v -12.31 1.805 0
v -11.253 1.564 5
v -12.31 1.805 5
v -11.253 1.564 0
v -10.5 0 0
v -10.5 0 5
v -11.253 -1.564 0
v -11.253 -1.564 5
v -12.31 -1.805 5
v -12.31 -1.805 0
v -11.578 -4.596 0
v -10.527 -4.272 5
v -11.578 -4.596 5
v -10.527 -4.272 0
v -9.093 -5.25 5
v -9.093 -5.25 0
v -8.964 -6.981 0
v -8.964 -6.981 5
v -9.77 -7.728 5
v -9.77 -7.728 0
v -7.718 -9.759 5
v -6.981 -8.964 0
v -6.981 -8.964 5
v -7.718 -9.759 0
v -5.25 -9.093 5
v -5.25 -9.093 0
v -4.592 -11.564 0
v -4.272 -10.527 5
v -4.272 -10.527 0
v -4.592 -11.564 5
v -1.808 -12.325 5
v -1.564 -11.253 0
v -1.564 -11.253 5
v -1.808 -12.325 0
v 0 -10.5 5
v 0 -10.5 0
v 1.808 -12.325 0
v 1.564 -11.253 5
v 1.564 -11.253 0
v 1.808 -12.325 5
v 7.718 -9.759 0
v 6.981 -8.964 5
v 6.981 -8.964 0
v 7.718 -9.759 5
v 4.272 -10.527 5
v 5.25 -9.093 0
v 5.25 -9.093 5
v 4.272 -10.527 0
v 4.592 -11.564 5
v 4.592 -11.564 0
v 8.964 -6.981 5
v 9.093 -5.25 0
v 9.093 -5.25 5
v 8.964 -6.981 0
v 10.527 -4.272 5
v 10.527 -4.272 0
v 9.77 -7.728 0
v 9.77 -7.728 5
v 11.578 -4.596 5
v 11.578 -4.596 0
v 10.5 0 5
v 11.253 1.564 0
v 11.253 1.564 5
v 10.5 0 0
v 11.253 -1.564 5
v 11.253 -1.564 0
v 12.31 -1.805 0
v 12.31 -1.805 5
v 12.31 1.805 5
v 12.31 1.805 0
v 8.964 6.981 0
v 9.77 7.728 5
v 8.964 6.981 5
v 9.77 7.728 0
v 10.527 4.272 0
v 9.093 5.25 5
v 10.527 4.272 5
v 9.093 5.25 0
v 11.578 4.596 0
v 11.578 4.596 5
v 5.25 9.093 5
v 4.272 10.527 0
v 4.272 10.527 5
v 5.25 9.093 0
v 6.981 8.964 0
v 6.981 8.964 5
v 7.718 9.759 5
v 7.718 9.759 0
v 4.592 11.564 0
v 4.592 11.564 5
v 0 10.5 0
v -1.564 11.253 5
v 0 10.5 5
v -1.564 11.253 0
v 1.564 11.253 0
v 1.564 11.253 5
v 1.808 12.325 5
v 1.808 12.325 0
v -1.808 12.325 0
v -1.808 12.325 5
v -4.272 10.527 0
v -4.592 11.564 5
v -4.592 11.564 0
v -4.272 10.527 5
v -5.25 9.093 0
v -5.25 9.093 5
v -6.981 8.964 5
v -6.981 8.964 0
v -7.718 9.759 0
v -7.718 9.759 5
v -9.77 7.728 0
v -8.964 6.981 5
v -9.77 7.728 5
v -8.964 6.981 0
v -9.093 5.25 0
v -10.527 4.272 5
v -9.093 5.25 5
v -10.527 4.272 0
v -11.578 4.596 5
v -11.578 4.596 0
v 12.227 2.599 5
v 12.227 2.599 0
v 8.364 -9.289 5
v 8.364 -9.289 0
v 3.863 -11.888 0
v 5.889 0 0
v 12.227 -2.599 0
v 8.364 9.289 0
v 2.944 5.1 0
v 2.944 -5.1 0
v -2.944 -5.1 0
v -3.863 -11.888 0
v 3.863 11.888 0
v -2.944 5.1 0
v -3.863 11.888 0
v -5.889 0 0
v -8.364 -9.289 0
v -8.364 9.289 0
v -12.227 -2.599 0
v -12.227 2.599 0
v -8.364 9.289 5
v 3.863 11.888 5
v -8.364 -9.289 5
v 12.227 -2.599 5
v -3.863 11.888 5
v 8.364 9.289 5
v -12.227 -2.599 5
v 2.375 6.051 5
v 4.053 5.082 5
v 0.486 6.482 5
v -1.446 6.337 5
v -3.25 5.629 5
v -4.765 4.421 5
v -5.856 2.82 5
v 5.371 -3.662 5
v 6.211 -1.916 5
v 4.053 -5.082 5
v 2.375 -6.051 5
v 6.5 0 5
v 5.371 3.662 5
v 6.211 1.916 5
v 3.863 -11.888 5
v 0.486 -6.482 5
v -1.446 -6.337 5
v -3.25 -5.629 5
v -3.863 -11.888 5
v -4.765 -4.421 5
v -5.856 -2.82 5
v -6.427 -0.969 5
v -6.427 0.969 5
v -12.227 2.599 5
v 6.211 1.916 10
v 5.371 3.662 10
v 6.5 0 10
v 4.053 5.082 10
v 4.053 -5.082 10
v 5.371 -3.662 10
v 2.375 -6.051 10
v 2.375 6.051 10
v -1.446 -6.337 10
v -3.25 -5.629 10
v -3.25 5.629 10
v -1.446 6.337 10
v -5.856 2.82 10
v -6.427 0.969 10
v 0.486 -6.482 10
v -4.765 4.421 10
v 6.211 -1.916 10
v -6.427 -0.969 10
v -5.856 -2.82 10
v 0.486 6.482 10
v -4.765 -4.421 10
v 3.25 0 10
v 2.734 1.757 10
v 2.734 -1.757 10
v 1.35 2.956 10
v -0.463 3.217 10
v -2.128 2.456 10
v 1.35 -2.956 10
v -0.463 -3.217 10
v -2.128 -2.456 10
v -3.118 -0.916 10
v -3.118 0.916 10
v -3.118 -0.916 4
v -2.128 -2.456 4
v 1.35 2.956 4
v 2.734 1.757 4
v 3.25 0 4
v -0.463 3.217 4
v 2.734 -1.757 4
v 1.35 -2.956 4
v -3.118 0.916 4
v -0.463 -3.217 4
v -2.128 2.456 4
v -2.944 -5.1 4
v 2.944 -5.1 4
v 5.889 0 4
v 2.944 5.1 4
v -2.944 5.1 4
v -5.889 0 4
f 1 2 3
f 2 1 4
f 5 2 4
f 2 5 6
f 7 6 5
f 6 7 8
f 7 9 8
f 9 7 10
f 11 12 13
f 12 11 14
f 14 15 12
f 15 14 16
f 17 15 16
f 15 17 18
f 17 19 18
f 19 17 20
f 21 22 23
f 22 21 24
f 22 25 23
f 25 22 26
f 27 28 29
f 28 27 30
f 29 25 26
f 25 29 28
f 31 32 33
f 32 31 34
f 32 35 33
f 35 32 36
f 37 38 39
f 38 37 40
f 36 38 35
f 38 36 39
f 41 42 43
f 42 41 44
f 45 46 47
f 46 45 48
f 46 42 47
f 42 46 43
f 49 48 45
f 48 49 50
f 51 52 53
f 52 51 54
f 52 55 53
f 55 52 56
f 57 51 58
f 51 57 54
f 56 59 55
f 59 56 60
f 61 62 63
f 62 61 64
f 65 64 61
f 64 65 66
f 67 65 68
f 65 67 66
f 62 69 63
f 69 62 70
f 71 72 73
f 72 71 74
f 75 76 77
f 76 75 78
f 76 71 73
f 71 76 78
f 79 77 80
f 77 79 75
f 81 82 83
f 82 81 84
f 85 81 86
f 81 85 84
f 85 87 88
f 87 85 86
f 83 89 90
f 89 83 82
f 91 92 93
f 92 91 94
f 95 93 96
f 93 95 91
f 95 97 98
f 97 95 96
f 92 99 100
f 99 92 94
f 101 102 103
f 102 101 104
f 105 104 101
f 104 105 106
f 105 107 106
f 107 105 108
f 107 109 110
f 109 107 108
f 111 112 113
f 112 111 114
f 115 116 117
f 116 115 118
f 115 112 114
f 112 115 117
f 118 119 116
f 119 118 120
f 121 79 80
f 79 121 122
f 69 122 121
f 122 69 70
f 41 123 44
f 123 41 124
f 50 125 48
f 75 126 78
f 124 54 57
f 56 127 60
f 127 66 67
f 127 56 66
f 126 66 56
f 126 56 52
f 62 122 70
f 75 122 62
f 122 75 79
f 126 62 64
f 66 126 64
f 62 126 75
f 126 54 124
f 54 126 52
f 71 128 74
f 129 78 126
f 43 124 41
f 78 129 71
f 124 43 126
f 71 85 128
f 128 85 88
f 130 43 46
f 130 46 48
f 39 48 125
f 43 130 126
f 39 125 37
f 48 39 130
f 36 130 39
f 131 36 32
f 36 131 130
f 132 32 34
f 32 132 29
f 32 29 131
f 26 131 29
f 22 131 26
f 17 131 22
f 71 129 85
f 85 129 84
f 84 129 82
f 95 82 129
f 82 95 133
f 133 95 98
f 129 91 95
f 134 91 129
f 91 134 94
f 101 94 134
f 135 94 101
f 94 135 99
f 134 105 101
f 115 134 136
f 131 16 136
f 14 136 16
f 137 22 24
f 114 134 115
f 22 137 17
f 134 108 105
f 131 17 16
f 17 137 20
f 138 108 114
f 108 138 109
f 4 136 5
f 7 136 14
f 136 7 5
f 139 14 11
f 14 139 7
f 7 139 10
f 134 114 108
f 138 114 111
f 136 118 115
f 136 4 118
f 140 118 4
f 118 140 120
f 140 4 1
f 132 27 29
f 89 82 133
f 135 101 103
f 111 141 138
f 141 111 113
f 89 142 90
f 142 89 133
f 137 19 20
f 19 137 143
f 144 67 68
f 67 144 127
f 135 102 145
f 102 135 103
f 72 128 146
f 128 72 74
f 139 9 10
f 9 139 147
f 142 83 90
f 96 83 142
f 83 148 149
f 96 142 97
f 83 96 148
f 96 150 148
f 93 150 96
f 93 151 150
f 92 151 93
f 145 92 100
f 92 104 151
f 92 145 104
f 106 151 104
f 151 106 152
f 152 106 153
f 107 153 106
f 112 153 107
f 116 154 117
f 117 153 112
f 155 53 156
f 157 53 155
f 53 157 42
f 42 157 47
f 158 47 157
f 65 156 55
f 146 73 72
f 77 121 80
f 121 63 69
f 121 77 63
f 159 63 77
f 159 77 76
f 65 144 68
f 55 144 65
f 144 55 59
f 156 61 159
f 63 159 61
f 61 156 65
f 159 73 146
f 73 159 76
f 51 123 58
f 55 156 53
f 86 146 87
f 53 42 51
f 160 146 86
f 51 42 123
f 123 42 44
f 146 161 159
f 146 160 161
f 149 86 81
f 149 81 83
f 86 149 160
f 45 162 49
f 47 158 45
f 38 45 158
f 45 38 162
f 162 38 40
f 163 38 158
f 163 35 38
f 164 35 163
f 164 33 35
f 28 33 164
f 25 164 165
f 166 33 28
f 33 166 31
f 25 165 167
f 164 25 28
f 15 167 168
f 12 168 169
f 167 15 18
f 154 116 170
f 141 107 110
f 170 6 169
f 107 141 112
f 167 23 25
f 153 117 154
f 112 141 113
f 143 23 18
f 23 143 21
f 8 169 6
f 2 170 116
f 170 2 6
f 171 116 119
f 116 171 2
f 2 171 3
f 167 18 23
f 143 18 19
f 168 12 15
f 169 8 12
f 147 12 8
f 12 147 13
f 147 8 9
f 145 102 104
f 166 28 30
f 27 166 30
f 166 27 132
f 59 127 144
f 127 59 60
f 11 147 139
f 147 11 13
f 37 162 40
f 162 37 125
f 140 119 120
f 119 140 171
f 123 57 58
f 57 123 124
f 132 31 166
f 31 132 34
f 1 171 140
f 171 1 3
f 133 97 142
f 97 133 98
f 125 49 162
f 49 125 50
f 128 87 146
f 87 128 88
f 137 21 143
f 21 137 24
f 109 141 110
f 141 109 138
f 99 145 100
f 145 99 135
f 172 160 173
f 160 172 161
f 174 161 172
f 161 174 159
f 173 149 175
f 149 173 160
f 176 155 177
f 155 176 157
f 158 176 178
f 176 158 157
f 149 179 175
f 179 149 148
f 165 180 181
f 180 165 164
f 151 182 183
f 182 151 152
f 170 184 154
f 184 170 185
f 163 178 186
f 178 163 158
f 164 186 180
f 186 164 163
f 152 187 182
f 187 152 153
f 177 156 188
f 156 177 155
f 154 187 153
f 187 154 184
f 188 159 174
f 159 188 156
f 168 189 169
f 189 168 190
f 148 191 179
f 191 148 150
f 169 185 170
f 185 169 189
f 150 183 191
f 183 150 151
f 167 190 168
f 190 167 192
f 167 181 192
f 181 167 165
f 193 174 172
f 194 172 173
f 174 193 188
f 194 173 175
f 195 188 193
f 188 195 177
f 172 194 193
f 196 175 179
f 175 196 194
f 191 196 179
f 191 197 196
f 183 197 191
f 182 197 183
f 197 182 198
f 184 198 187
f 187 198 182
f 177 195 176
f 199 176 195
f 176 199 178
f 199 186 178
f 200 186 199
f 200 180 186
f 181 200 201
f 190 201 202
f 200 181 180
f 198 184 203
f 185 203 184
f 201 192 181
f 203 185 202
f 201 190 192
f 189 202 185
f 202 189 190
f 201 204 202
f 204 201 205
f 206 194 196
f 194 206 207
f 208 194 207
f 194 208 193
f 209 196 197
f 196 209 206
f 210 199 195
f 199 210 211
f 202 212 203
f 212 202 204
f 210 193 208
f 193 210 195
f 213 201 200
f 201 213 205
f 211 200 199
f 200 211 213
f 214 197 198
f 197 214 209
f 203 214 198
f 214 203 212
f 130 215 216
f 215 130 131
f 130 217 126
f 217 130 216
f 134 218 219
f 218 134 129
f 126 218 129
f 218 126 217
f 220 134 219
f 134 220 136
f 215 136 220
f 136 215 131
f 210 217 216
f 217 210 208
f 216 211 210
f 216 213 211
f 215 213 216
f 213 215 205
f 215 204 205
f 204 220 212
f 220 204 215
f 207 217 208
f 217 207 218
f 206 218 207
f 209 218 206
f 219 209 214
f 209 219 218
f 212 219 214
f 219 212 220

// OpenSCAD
//Size of the wrench used to tightnen (mm)
WrenchSize=10.2;

//Thickness of the handle piece(mm)
HandleH=5;

//Height of the inner cylinder (mm(
InnerH=10;

//Diameter of Handle piece (mm)
HandleD=25;

//Diameter of the pass-through hole (mm)
HoleD=6.5;

//Nut trap depth (mm)
NutH=4;

//Handle decoration/grip radius (mm)
DecoR=2;

//Number of Decoration/grip bites
DecoN=12;

//Decoration offset, increase to decrease the arch of decoration (mm) (<DecoR)
DecoOS=0;

//Decoration smoothness, increase to make smoother decorations (mm)
DecoSu=0;


module Handle1(D,H,dr,dn,dos,ds){
minkowski(){
	difference(){
		cylinder(r=D/2-ds, h=H);
		for (a = [0:360/dn:360]){
	           rotate([0,0,a])
	            translate([-(D-ds)/2-dos,0,-0.5]) cylinder(r=dr+ds/2,h=H+1);
	       }
		}
	//sphere(r=ds);
	cylinder(r=ds,h=1, $fn=10);
	}
}

module Handle(D,H,dr,dn,dos,ds){

if(ds>0){
	Handle1(D,H-1,dr,dn,dos,ds);
}else{
	Handle1(D,H,dr,dn,dos,ds);
}
}

module BoltHandle(WrenchSize, HandleH, TotalH, HandleD, HoleD, NutH, DecoR, DecoN,DecoOS=0,DecoSu=0){
difference(){
	union(){
		Handle(HandleD,HandleH,DecoR,DecoN,DecoOS,DecoSu);
		cylinder(r=HoleD, h = TotalH);	
	}
	cylinder(r=HoleD/2,h=TotalH);
	cylinder(r=sqrt(3)*WrenchSize/3,h=NutH,$fn=6);

}
}


BoltHandle(WrenchSize,HandleH,InnerH,HandleD,HoleD,NutH,DecoR,DecoN,DecoOS,DecoSu);
